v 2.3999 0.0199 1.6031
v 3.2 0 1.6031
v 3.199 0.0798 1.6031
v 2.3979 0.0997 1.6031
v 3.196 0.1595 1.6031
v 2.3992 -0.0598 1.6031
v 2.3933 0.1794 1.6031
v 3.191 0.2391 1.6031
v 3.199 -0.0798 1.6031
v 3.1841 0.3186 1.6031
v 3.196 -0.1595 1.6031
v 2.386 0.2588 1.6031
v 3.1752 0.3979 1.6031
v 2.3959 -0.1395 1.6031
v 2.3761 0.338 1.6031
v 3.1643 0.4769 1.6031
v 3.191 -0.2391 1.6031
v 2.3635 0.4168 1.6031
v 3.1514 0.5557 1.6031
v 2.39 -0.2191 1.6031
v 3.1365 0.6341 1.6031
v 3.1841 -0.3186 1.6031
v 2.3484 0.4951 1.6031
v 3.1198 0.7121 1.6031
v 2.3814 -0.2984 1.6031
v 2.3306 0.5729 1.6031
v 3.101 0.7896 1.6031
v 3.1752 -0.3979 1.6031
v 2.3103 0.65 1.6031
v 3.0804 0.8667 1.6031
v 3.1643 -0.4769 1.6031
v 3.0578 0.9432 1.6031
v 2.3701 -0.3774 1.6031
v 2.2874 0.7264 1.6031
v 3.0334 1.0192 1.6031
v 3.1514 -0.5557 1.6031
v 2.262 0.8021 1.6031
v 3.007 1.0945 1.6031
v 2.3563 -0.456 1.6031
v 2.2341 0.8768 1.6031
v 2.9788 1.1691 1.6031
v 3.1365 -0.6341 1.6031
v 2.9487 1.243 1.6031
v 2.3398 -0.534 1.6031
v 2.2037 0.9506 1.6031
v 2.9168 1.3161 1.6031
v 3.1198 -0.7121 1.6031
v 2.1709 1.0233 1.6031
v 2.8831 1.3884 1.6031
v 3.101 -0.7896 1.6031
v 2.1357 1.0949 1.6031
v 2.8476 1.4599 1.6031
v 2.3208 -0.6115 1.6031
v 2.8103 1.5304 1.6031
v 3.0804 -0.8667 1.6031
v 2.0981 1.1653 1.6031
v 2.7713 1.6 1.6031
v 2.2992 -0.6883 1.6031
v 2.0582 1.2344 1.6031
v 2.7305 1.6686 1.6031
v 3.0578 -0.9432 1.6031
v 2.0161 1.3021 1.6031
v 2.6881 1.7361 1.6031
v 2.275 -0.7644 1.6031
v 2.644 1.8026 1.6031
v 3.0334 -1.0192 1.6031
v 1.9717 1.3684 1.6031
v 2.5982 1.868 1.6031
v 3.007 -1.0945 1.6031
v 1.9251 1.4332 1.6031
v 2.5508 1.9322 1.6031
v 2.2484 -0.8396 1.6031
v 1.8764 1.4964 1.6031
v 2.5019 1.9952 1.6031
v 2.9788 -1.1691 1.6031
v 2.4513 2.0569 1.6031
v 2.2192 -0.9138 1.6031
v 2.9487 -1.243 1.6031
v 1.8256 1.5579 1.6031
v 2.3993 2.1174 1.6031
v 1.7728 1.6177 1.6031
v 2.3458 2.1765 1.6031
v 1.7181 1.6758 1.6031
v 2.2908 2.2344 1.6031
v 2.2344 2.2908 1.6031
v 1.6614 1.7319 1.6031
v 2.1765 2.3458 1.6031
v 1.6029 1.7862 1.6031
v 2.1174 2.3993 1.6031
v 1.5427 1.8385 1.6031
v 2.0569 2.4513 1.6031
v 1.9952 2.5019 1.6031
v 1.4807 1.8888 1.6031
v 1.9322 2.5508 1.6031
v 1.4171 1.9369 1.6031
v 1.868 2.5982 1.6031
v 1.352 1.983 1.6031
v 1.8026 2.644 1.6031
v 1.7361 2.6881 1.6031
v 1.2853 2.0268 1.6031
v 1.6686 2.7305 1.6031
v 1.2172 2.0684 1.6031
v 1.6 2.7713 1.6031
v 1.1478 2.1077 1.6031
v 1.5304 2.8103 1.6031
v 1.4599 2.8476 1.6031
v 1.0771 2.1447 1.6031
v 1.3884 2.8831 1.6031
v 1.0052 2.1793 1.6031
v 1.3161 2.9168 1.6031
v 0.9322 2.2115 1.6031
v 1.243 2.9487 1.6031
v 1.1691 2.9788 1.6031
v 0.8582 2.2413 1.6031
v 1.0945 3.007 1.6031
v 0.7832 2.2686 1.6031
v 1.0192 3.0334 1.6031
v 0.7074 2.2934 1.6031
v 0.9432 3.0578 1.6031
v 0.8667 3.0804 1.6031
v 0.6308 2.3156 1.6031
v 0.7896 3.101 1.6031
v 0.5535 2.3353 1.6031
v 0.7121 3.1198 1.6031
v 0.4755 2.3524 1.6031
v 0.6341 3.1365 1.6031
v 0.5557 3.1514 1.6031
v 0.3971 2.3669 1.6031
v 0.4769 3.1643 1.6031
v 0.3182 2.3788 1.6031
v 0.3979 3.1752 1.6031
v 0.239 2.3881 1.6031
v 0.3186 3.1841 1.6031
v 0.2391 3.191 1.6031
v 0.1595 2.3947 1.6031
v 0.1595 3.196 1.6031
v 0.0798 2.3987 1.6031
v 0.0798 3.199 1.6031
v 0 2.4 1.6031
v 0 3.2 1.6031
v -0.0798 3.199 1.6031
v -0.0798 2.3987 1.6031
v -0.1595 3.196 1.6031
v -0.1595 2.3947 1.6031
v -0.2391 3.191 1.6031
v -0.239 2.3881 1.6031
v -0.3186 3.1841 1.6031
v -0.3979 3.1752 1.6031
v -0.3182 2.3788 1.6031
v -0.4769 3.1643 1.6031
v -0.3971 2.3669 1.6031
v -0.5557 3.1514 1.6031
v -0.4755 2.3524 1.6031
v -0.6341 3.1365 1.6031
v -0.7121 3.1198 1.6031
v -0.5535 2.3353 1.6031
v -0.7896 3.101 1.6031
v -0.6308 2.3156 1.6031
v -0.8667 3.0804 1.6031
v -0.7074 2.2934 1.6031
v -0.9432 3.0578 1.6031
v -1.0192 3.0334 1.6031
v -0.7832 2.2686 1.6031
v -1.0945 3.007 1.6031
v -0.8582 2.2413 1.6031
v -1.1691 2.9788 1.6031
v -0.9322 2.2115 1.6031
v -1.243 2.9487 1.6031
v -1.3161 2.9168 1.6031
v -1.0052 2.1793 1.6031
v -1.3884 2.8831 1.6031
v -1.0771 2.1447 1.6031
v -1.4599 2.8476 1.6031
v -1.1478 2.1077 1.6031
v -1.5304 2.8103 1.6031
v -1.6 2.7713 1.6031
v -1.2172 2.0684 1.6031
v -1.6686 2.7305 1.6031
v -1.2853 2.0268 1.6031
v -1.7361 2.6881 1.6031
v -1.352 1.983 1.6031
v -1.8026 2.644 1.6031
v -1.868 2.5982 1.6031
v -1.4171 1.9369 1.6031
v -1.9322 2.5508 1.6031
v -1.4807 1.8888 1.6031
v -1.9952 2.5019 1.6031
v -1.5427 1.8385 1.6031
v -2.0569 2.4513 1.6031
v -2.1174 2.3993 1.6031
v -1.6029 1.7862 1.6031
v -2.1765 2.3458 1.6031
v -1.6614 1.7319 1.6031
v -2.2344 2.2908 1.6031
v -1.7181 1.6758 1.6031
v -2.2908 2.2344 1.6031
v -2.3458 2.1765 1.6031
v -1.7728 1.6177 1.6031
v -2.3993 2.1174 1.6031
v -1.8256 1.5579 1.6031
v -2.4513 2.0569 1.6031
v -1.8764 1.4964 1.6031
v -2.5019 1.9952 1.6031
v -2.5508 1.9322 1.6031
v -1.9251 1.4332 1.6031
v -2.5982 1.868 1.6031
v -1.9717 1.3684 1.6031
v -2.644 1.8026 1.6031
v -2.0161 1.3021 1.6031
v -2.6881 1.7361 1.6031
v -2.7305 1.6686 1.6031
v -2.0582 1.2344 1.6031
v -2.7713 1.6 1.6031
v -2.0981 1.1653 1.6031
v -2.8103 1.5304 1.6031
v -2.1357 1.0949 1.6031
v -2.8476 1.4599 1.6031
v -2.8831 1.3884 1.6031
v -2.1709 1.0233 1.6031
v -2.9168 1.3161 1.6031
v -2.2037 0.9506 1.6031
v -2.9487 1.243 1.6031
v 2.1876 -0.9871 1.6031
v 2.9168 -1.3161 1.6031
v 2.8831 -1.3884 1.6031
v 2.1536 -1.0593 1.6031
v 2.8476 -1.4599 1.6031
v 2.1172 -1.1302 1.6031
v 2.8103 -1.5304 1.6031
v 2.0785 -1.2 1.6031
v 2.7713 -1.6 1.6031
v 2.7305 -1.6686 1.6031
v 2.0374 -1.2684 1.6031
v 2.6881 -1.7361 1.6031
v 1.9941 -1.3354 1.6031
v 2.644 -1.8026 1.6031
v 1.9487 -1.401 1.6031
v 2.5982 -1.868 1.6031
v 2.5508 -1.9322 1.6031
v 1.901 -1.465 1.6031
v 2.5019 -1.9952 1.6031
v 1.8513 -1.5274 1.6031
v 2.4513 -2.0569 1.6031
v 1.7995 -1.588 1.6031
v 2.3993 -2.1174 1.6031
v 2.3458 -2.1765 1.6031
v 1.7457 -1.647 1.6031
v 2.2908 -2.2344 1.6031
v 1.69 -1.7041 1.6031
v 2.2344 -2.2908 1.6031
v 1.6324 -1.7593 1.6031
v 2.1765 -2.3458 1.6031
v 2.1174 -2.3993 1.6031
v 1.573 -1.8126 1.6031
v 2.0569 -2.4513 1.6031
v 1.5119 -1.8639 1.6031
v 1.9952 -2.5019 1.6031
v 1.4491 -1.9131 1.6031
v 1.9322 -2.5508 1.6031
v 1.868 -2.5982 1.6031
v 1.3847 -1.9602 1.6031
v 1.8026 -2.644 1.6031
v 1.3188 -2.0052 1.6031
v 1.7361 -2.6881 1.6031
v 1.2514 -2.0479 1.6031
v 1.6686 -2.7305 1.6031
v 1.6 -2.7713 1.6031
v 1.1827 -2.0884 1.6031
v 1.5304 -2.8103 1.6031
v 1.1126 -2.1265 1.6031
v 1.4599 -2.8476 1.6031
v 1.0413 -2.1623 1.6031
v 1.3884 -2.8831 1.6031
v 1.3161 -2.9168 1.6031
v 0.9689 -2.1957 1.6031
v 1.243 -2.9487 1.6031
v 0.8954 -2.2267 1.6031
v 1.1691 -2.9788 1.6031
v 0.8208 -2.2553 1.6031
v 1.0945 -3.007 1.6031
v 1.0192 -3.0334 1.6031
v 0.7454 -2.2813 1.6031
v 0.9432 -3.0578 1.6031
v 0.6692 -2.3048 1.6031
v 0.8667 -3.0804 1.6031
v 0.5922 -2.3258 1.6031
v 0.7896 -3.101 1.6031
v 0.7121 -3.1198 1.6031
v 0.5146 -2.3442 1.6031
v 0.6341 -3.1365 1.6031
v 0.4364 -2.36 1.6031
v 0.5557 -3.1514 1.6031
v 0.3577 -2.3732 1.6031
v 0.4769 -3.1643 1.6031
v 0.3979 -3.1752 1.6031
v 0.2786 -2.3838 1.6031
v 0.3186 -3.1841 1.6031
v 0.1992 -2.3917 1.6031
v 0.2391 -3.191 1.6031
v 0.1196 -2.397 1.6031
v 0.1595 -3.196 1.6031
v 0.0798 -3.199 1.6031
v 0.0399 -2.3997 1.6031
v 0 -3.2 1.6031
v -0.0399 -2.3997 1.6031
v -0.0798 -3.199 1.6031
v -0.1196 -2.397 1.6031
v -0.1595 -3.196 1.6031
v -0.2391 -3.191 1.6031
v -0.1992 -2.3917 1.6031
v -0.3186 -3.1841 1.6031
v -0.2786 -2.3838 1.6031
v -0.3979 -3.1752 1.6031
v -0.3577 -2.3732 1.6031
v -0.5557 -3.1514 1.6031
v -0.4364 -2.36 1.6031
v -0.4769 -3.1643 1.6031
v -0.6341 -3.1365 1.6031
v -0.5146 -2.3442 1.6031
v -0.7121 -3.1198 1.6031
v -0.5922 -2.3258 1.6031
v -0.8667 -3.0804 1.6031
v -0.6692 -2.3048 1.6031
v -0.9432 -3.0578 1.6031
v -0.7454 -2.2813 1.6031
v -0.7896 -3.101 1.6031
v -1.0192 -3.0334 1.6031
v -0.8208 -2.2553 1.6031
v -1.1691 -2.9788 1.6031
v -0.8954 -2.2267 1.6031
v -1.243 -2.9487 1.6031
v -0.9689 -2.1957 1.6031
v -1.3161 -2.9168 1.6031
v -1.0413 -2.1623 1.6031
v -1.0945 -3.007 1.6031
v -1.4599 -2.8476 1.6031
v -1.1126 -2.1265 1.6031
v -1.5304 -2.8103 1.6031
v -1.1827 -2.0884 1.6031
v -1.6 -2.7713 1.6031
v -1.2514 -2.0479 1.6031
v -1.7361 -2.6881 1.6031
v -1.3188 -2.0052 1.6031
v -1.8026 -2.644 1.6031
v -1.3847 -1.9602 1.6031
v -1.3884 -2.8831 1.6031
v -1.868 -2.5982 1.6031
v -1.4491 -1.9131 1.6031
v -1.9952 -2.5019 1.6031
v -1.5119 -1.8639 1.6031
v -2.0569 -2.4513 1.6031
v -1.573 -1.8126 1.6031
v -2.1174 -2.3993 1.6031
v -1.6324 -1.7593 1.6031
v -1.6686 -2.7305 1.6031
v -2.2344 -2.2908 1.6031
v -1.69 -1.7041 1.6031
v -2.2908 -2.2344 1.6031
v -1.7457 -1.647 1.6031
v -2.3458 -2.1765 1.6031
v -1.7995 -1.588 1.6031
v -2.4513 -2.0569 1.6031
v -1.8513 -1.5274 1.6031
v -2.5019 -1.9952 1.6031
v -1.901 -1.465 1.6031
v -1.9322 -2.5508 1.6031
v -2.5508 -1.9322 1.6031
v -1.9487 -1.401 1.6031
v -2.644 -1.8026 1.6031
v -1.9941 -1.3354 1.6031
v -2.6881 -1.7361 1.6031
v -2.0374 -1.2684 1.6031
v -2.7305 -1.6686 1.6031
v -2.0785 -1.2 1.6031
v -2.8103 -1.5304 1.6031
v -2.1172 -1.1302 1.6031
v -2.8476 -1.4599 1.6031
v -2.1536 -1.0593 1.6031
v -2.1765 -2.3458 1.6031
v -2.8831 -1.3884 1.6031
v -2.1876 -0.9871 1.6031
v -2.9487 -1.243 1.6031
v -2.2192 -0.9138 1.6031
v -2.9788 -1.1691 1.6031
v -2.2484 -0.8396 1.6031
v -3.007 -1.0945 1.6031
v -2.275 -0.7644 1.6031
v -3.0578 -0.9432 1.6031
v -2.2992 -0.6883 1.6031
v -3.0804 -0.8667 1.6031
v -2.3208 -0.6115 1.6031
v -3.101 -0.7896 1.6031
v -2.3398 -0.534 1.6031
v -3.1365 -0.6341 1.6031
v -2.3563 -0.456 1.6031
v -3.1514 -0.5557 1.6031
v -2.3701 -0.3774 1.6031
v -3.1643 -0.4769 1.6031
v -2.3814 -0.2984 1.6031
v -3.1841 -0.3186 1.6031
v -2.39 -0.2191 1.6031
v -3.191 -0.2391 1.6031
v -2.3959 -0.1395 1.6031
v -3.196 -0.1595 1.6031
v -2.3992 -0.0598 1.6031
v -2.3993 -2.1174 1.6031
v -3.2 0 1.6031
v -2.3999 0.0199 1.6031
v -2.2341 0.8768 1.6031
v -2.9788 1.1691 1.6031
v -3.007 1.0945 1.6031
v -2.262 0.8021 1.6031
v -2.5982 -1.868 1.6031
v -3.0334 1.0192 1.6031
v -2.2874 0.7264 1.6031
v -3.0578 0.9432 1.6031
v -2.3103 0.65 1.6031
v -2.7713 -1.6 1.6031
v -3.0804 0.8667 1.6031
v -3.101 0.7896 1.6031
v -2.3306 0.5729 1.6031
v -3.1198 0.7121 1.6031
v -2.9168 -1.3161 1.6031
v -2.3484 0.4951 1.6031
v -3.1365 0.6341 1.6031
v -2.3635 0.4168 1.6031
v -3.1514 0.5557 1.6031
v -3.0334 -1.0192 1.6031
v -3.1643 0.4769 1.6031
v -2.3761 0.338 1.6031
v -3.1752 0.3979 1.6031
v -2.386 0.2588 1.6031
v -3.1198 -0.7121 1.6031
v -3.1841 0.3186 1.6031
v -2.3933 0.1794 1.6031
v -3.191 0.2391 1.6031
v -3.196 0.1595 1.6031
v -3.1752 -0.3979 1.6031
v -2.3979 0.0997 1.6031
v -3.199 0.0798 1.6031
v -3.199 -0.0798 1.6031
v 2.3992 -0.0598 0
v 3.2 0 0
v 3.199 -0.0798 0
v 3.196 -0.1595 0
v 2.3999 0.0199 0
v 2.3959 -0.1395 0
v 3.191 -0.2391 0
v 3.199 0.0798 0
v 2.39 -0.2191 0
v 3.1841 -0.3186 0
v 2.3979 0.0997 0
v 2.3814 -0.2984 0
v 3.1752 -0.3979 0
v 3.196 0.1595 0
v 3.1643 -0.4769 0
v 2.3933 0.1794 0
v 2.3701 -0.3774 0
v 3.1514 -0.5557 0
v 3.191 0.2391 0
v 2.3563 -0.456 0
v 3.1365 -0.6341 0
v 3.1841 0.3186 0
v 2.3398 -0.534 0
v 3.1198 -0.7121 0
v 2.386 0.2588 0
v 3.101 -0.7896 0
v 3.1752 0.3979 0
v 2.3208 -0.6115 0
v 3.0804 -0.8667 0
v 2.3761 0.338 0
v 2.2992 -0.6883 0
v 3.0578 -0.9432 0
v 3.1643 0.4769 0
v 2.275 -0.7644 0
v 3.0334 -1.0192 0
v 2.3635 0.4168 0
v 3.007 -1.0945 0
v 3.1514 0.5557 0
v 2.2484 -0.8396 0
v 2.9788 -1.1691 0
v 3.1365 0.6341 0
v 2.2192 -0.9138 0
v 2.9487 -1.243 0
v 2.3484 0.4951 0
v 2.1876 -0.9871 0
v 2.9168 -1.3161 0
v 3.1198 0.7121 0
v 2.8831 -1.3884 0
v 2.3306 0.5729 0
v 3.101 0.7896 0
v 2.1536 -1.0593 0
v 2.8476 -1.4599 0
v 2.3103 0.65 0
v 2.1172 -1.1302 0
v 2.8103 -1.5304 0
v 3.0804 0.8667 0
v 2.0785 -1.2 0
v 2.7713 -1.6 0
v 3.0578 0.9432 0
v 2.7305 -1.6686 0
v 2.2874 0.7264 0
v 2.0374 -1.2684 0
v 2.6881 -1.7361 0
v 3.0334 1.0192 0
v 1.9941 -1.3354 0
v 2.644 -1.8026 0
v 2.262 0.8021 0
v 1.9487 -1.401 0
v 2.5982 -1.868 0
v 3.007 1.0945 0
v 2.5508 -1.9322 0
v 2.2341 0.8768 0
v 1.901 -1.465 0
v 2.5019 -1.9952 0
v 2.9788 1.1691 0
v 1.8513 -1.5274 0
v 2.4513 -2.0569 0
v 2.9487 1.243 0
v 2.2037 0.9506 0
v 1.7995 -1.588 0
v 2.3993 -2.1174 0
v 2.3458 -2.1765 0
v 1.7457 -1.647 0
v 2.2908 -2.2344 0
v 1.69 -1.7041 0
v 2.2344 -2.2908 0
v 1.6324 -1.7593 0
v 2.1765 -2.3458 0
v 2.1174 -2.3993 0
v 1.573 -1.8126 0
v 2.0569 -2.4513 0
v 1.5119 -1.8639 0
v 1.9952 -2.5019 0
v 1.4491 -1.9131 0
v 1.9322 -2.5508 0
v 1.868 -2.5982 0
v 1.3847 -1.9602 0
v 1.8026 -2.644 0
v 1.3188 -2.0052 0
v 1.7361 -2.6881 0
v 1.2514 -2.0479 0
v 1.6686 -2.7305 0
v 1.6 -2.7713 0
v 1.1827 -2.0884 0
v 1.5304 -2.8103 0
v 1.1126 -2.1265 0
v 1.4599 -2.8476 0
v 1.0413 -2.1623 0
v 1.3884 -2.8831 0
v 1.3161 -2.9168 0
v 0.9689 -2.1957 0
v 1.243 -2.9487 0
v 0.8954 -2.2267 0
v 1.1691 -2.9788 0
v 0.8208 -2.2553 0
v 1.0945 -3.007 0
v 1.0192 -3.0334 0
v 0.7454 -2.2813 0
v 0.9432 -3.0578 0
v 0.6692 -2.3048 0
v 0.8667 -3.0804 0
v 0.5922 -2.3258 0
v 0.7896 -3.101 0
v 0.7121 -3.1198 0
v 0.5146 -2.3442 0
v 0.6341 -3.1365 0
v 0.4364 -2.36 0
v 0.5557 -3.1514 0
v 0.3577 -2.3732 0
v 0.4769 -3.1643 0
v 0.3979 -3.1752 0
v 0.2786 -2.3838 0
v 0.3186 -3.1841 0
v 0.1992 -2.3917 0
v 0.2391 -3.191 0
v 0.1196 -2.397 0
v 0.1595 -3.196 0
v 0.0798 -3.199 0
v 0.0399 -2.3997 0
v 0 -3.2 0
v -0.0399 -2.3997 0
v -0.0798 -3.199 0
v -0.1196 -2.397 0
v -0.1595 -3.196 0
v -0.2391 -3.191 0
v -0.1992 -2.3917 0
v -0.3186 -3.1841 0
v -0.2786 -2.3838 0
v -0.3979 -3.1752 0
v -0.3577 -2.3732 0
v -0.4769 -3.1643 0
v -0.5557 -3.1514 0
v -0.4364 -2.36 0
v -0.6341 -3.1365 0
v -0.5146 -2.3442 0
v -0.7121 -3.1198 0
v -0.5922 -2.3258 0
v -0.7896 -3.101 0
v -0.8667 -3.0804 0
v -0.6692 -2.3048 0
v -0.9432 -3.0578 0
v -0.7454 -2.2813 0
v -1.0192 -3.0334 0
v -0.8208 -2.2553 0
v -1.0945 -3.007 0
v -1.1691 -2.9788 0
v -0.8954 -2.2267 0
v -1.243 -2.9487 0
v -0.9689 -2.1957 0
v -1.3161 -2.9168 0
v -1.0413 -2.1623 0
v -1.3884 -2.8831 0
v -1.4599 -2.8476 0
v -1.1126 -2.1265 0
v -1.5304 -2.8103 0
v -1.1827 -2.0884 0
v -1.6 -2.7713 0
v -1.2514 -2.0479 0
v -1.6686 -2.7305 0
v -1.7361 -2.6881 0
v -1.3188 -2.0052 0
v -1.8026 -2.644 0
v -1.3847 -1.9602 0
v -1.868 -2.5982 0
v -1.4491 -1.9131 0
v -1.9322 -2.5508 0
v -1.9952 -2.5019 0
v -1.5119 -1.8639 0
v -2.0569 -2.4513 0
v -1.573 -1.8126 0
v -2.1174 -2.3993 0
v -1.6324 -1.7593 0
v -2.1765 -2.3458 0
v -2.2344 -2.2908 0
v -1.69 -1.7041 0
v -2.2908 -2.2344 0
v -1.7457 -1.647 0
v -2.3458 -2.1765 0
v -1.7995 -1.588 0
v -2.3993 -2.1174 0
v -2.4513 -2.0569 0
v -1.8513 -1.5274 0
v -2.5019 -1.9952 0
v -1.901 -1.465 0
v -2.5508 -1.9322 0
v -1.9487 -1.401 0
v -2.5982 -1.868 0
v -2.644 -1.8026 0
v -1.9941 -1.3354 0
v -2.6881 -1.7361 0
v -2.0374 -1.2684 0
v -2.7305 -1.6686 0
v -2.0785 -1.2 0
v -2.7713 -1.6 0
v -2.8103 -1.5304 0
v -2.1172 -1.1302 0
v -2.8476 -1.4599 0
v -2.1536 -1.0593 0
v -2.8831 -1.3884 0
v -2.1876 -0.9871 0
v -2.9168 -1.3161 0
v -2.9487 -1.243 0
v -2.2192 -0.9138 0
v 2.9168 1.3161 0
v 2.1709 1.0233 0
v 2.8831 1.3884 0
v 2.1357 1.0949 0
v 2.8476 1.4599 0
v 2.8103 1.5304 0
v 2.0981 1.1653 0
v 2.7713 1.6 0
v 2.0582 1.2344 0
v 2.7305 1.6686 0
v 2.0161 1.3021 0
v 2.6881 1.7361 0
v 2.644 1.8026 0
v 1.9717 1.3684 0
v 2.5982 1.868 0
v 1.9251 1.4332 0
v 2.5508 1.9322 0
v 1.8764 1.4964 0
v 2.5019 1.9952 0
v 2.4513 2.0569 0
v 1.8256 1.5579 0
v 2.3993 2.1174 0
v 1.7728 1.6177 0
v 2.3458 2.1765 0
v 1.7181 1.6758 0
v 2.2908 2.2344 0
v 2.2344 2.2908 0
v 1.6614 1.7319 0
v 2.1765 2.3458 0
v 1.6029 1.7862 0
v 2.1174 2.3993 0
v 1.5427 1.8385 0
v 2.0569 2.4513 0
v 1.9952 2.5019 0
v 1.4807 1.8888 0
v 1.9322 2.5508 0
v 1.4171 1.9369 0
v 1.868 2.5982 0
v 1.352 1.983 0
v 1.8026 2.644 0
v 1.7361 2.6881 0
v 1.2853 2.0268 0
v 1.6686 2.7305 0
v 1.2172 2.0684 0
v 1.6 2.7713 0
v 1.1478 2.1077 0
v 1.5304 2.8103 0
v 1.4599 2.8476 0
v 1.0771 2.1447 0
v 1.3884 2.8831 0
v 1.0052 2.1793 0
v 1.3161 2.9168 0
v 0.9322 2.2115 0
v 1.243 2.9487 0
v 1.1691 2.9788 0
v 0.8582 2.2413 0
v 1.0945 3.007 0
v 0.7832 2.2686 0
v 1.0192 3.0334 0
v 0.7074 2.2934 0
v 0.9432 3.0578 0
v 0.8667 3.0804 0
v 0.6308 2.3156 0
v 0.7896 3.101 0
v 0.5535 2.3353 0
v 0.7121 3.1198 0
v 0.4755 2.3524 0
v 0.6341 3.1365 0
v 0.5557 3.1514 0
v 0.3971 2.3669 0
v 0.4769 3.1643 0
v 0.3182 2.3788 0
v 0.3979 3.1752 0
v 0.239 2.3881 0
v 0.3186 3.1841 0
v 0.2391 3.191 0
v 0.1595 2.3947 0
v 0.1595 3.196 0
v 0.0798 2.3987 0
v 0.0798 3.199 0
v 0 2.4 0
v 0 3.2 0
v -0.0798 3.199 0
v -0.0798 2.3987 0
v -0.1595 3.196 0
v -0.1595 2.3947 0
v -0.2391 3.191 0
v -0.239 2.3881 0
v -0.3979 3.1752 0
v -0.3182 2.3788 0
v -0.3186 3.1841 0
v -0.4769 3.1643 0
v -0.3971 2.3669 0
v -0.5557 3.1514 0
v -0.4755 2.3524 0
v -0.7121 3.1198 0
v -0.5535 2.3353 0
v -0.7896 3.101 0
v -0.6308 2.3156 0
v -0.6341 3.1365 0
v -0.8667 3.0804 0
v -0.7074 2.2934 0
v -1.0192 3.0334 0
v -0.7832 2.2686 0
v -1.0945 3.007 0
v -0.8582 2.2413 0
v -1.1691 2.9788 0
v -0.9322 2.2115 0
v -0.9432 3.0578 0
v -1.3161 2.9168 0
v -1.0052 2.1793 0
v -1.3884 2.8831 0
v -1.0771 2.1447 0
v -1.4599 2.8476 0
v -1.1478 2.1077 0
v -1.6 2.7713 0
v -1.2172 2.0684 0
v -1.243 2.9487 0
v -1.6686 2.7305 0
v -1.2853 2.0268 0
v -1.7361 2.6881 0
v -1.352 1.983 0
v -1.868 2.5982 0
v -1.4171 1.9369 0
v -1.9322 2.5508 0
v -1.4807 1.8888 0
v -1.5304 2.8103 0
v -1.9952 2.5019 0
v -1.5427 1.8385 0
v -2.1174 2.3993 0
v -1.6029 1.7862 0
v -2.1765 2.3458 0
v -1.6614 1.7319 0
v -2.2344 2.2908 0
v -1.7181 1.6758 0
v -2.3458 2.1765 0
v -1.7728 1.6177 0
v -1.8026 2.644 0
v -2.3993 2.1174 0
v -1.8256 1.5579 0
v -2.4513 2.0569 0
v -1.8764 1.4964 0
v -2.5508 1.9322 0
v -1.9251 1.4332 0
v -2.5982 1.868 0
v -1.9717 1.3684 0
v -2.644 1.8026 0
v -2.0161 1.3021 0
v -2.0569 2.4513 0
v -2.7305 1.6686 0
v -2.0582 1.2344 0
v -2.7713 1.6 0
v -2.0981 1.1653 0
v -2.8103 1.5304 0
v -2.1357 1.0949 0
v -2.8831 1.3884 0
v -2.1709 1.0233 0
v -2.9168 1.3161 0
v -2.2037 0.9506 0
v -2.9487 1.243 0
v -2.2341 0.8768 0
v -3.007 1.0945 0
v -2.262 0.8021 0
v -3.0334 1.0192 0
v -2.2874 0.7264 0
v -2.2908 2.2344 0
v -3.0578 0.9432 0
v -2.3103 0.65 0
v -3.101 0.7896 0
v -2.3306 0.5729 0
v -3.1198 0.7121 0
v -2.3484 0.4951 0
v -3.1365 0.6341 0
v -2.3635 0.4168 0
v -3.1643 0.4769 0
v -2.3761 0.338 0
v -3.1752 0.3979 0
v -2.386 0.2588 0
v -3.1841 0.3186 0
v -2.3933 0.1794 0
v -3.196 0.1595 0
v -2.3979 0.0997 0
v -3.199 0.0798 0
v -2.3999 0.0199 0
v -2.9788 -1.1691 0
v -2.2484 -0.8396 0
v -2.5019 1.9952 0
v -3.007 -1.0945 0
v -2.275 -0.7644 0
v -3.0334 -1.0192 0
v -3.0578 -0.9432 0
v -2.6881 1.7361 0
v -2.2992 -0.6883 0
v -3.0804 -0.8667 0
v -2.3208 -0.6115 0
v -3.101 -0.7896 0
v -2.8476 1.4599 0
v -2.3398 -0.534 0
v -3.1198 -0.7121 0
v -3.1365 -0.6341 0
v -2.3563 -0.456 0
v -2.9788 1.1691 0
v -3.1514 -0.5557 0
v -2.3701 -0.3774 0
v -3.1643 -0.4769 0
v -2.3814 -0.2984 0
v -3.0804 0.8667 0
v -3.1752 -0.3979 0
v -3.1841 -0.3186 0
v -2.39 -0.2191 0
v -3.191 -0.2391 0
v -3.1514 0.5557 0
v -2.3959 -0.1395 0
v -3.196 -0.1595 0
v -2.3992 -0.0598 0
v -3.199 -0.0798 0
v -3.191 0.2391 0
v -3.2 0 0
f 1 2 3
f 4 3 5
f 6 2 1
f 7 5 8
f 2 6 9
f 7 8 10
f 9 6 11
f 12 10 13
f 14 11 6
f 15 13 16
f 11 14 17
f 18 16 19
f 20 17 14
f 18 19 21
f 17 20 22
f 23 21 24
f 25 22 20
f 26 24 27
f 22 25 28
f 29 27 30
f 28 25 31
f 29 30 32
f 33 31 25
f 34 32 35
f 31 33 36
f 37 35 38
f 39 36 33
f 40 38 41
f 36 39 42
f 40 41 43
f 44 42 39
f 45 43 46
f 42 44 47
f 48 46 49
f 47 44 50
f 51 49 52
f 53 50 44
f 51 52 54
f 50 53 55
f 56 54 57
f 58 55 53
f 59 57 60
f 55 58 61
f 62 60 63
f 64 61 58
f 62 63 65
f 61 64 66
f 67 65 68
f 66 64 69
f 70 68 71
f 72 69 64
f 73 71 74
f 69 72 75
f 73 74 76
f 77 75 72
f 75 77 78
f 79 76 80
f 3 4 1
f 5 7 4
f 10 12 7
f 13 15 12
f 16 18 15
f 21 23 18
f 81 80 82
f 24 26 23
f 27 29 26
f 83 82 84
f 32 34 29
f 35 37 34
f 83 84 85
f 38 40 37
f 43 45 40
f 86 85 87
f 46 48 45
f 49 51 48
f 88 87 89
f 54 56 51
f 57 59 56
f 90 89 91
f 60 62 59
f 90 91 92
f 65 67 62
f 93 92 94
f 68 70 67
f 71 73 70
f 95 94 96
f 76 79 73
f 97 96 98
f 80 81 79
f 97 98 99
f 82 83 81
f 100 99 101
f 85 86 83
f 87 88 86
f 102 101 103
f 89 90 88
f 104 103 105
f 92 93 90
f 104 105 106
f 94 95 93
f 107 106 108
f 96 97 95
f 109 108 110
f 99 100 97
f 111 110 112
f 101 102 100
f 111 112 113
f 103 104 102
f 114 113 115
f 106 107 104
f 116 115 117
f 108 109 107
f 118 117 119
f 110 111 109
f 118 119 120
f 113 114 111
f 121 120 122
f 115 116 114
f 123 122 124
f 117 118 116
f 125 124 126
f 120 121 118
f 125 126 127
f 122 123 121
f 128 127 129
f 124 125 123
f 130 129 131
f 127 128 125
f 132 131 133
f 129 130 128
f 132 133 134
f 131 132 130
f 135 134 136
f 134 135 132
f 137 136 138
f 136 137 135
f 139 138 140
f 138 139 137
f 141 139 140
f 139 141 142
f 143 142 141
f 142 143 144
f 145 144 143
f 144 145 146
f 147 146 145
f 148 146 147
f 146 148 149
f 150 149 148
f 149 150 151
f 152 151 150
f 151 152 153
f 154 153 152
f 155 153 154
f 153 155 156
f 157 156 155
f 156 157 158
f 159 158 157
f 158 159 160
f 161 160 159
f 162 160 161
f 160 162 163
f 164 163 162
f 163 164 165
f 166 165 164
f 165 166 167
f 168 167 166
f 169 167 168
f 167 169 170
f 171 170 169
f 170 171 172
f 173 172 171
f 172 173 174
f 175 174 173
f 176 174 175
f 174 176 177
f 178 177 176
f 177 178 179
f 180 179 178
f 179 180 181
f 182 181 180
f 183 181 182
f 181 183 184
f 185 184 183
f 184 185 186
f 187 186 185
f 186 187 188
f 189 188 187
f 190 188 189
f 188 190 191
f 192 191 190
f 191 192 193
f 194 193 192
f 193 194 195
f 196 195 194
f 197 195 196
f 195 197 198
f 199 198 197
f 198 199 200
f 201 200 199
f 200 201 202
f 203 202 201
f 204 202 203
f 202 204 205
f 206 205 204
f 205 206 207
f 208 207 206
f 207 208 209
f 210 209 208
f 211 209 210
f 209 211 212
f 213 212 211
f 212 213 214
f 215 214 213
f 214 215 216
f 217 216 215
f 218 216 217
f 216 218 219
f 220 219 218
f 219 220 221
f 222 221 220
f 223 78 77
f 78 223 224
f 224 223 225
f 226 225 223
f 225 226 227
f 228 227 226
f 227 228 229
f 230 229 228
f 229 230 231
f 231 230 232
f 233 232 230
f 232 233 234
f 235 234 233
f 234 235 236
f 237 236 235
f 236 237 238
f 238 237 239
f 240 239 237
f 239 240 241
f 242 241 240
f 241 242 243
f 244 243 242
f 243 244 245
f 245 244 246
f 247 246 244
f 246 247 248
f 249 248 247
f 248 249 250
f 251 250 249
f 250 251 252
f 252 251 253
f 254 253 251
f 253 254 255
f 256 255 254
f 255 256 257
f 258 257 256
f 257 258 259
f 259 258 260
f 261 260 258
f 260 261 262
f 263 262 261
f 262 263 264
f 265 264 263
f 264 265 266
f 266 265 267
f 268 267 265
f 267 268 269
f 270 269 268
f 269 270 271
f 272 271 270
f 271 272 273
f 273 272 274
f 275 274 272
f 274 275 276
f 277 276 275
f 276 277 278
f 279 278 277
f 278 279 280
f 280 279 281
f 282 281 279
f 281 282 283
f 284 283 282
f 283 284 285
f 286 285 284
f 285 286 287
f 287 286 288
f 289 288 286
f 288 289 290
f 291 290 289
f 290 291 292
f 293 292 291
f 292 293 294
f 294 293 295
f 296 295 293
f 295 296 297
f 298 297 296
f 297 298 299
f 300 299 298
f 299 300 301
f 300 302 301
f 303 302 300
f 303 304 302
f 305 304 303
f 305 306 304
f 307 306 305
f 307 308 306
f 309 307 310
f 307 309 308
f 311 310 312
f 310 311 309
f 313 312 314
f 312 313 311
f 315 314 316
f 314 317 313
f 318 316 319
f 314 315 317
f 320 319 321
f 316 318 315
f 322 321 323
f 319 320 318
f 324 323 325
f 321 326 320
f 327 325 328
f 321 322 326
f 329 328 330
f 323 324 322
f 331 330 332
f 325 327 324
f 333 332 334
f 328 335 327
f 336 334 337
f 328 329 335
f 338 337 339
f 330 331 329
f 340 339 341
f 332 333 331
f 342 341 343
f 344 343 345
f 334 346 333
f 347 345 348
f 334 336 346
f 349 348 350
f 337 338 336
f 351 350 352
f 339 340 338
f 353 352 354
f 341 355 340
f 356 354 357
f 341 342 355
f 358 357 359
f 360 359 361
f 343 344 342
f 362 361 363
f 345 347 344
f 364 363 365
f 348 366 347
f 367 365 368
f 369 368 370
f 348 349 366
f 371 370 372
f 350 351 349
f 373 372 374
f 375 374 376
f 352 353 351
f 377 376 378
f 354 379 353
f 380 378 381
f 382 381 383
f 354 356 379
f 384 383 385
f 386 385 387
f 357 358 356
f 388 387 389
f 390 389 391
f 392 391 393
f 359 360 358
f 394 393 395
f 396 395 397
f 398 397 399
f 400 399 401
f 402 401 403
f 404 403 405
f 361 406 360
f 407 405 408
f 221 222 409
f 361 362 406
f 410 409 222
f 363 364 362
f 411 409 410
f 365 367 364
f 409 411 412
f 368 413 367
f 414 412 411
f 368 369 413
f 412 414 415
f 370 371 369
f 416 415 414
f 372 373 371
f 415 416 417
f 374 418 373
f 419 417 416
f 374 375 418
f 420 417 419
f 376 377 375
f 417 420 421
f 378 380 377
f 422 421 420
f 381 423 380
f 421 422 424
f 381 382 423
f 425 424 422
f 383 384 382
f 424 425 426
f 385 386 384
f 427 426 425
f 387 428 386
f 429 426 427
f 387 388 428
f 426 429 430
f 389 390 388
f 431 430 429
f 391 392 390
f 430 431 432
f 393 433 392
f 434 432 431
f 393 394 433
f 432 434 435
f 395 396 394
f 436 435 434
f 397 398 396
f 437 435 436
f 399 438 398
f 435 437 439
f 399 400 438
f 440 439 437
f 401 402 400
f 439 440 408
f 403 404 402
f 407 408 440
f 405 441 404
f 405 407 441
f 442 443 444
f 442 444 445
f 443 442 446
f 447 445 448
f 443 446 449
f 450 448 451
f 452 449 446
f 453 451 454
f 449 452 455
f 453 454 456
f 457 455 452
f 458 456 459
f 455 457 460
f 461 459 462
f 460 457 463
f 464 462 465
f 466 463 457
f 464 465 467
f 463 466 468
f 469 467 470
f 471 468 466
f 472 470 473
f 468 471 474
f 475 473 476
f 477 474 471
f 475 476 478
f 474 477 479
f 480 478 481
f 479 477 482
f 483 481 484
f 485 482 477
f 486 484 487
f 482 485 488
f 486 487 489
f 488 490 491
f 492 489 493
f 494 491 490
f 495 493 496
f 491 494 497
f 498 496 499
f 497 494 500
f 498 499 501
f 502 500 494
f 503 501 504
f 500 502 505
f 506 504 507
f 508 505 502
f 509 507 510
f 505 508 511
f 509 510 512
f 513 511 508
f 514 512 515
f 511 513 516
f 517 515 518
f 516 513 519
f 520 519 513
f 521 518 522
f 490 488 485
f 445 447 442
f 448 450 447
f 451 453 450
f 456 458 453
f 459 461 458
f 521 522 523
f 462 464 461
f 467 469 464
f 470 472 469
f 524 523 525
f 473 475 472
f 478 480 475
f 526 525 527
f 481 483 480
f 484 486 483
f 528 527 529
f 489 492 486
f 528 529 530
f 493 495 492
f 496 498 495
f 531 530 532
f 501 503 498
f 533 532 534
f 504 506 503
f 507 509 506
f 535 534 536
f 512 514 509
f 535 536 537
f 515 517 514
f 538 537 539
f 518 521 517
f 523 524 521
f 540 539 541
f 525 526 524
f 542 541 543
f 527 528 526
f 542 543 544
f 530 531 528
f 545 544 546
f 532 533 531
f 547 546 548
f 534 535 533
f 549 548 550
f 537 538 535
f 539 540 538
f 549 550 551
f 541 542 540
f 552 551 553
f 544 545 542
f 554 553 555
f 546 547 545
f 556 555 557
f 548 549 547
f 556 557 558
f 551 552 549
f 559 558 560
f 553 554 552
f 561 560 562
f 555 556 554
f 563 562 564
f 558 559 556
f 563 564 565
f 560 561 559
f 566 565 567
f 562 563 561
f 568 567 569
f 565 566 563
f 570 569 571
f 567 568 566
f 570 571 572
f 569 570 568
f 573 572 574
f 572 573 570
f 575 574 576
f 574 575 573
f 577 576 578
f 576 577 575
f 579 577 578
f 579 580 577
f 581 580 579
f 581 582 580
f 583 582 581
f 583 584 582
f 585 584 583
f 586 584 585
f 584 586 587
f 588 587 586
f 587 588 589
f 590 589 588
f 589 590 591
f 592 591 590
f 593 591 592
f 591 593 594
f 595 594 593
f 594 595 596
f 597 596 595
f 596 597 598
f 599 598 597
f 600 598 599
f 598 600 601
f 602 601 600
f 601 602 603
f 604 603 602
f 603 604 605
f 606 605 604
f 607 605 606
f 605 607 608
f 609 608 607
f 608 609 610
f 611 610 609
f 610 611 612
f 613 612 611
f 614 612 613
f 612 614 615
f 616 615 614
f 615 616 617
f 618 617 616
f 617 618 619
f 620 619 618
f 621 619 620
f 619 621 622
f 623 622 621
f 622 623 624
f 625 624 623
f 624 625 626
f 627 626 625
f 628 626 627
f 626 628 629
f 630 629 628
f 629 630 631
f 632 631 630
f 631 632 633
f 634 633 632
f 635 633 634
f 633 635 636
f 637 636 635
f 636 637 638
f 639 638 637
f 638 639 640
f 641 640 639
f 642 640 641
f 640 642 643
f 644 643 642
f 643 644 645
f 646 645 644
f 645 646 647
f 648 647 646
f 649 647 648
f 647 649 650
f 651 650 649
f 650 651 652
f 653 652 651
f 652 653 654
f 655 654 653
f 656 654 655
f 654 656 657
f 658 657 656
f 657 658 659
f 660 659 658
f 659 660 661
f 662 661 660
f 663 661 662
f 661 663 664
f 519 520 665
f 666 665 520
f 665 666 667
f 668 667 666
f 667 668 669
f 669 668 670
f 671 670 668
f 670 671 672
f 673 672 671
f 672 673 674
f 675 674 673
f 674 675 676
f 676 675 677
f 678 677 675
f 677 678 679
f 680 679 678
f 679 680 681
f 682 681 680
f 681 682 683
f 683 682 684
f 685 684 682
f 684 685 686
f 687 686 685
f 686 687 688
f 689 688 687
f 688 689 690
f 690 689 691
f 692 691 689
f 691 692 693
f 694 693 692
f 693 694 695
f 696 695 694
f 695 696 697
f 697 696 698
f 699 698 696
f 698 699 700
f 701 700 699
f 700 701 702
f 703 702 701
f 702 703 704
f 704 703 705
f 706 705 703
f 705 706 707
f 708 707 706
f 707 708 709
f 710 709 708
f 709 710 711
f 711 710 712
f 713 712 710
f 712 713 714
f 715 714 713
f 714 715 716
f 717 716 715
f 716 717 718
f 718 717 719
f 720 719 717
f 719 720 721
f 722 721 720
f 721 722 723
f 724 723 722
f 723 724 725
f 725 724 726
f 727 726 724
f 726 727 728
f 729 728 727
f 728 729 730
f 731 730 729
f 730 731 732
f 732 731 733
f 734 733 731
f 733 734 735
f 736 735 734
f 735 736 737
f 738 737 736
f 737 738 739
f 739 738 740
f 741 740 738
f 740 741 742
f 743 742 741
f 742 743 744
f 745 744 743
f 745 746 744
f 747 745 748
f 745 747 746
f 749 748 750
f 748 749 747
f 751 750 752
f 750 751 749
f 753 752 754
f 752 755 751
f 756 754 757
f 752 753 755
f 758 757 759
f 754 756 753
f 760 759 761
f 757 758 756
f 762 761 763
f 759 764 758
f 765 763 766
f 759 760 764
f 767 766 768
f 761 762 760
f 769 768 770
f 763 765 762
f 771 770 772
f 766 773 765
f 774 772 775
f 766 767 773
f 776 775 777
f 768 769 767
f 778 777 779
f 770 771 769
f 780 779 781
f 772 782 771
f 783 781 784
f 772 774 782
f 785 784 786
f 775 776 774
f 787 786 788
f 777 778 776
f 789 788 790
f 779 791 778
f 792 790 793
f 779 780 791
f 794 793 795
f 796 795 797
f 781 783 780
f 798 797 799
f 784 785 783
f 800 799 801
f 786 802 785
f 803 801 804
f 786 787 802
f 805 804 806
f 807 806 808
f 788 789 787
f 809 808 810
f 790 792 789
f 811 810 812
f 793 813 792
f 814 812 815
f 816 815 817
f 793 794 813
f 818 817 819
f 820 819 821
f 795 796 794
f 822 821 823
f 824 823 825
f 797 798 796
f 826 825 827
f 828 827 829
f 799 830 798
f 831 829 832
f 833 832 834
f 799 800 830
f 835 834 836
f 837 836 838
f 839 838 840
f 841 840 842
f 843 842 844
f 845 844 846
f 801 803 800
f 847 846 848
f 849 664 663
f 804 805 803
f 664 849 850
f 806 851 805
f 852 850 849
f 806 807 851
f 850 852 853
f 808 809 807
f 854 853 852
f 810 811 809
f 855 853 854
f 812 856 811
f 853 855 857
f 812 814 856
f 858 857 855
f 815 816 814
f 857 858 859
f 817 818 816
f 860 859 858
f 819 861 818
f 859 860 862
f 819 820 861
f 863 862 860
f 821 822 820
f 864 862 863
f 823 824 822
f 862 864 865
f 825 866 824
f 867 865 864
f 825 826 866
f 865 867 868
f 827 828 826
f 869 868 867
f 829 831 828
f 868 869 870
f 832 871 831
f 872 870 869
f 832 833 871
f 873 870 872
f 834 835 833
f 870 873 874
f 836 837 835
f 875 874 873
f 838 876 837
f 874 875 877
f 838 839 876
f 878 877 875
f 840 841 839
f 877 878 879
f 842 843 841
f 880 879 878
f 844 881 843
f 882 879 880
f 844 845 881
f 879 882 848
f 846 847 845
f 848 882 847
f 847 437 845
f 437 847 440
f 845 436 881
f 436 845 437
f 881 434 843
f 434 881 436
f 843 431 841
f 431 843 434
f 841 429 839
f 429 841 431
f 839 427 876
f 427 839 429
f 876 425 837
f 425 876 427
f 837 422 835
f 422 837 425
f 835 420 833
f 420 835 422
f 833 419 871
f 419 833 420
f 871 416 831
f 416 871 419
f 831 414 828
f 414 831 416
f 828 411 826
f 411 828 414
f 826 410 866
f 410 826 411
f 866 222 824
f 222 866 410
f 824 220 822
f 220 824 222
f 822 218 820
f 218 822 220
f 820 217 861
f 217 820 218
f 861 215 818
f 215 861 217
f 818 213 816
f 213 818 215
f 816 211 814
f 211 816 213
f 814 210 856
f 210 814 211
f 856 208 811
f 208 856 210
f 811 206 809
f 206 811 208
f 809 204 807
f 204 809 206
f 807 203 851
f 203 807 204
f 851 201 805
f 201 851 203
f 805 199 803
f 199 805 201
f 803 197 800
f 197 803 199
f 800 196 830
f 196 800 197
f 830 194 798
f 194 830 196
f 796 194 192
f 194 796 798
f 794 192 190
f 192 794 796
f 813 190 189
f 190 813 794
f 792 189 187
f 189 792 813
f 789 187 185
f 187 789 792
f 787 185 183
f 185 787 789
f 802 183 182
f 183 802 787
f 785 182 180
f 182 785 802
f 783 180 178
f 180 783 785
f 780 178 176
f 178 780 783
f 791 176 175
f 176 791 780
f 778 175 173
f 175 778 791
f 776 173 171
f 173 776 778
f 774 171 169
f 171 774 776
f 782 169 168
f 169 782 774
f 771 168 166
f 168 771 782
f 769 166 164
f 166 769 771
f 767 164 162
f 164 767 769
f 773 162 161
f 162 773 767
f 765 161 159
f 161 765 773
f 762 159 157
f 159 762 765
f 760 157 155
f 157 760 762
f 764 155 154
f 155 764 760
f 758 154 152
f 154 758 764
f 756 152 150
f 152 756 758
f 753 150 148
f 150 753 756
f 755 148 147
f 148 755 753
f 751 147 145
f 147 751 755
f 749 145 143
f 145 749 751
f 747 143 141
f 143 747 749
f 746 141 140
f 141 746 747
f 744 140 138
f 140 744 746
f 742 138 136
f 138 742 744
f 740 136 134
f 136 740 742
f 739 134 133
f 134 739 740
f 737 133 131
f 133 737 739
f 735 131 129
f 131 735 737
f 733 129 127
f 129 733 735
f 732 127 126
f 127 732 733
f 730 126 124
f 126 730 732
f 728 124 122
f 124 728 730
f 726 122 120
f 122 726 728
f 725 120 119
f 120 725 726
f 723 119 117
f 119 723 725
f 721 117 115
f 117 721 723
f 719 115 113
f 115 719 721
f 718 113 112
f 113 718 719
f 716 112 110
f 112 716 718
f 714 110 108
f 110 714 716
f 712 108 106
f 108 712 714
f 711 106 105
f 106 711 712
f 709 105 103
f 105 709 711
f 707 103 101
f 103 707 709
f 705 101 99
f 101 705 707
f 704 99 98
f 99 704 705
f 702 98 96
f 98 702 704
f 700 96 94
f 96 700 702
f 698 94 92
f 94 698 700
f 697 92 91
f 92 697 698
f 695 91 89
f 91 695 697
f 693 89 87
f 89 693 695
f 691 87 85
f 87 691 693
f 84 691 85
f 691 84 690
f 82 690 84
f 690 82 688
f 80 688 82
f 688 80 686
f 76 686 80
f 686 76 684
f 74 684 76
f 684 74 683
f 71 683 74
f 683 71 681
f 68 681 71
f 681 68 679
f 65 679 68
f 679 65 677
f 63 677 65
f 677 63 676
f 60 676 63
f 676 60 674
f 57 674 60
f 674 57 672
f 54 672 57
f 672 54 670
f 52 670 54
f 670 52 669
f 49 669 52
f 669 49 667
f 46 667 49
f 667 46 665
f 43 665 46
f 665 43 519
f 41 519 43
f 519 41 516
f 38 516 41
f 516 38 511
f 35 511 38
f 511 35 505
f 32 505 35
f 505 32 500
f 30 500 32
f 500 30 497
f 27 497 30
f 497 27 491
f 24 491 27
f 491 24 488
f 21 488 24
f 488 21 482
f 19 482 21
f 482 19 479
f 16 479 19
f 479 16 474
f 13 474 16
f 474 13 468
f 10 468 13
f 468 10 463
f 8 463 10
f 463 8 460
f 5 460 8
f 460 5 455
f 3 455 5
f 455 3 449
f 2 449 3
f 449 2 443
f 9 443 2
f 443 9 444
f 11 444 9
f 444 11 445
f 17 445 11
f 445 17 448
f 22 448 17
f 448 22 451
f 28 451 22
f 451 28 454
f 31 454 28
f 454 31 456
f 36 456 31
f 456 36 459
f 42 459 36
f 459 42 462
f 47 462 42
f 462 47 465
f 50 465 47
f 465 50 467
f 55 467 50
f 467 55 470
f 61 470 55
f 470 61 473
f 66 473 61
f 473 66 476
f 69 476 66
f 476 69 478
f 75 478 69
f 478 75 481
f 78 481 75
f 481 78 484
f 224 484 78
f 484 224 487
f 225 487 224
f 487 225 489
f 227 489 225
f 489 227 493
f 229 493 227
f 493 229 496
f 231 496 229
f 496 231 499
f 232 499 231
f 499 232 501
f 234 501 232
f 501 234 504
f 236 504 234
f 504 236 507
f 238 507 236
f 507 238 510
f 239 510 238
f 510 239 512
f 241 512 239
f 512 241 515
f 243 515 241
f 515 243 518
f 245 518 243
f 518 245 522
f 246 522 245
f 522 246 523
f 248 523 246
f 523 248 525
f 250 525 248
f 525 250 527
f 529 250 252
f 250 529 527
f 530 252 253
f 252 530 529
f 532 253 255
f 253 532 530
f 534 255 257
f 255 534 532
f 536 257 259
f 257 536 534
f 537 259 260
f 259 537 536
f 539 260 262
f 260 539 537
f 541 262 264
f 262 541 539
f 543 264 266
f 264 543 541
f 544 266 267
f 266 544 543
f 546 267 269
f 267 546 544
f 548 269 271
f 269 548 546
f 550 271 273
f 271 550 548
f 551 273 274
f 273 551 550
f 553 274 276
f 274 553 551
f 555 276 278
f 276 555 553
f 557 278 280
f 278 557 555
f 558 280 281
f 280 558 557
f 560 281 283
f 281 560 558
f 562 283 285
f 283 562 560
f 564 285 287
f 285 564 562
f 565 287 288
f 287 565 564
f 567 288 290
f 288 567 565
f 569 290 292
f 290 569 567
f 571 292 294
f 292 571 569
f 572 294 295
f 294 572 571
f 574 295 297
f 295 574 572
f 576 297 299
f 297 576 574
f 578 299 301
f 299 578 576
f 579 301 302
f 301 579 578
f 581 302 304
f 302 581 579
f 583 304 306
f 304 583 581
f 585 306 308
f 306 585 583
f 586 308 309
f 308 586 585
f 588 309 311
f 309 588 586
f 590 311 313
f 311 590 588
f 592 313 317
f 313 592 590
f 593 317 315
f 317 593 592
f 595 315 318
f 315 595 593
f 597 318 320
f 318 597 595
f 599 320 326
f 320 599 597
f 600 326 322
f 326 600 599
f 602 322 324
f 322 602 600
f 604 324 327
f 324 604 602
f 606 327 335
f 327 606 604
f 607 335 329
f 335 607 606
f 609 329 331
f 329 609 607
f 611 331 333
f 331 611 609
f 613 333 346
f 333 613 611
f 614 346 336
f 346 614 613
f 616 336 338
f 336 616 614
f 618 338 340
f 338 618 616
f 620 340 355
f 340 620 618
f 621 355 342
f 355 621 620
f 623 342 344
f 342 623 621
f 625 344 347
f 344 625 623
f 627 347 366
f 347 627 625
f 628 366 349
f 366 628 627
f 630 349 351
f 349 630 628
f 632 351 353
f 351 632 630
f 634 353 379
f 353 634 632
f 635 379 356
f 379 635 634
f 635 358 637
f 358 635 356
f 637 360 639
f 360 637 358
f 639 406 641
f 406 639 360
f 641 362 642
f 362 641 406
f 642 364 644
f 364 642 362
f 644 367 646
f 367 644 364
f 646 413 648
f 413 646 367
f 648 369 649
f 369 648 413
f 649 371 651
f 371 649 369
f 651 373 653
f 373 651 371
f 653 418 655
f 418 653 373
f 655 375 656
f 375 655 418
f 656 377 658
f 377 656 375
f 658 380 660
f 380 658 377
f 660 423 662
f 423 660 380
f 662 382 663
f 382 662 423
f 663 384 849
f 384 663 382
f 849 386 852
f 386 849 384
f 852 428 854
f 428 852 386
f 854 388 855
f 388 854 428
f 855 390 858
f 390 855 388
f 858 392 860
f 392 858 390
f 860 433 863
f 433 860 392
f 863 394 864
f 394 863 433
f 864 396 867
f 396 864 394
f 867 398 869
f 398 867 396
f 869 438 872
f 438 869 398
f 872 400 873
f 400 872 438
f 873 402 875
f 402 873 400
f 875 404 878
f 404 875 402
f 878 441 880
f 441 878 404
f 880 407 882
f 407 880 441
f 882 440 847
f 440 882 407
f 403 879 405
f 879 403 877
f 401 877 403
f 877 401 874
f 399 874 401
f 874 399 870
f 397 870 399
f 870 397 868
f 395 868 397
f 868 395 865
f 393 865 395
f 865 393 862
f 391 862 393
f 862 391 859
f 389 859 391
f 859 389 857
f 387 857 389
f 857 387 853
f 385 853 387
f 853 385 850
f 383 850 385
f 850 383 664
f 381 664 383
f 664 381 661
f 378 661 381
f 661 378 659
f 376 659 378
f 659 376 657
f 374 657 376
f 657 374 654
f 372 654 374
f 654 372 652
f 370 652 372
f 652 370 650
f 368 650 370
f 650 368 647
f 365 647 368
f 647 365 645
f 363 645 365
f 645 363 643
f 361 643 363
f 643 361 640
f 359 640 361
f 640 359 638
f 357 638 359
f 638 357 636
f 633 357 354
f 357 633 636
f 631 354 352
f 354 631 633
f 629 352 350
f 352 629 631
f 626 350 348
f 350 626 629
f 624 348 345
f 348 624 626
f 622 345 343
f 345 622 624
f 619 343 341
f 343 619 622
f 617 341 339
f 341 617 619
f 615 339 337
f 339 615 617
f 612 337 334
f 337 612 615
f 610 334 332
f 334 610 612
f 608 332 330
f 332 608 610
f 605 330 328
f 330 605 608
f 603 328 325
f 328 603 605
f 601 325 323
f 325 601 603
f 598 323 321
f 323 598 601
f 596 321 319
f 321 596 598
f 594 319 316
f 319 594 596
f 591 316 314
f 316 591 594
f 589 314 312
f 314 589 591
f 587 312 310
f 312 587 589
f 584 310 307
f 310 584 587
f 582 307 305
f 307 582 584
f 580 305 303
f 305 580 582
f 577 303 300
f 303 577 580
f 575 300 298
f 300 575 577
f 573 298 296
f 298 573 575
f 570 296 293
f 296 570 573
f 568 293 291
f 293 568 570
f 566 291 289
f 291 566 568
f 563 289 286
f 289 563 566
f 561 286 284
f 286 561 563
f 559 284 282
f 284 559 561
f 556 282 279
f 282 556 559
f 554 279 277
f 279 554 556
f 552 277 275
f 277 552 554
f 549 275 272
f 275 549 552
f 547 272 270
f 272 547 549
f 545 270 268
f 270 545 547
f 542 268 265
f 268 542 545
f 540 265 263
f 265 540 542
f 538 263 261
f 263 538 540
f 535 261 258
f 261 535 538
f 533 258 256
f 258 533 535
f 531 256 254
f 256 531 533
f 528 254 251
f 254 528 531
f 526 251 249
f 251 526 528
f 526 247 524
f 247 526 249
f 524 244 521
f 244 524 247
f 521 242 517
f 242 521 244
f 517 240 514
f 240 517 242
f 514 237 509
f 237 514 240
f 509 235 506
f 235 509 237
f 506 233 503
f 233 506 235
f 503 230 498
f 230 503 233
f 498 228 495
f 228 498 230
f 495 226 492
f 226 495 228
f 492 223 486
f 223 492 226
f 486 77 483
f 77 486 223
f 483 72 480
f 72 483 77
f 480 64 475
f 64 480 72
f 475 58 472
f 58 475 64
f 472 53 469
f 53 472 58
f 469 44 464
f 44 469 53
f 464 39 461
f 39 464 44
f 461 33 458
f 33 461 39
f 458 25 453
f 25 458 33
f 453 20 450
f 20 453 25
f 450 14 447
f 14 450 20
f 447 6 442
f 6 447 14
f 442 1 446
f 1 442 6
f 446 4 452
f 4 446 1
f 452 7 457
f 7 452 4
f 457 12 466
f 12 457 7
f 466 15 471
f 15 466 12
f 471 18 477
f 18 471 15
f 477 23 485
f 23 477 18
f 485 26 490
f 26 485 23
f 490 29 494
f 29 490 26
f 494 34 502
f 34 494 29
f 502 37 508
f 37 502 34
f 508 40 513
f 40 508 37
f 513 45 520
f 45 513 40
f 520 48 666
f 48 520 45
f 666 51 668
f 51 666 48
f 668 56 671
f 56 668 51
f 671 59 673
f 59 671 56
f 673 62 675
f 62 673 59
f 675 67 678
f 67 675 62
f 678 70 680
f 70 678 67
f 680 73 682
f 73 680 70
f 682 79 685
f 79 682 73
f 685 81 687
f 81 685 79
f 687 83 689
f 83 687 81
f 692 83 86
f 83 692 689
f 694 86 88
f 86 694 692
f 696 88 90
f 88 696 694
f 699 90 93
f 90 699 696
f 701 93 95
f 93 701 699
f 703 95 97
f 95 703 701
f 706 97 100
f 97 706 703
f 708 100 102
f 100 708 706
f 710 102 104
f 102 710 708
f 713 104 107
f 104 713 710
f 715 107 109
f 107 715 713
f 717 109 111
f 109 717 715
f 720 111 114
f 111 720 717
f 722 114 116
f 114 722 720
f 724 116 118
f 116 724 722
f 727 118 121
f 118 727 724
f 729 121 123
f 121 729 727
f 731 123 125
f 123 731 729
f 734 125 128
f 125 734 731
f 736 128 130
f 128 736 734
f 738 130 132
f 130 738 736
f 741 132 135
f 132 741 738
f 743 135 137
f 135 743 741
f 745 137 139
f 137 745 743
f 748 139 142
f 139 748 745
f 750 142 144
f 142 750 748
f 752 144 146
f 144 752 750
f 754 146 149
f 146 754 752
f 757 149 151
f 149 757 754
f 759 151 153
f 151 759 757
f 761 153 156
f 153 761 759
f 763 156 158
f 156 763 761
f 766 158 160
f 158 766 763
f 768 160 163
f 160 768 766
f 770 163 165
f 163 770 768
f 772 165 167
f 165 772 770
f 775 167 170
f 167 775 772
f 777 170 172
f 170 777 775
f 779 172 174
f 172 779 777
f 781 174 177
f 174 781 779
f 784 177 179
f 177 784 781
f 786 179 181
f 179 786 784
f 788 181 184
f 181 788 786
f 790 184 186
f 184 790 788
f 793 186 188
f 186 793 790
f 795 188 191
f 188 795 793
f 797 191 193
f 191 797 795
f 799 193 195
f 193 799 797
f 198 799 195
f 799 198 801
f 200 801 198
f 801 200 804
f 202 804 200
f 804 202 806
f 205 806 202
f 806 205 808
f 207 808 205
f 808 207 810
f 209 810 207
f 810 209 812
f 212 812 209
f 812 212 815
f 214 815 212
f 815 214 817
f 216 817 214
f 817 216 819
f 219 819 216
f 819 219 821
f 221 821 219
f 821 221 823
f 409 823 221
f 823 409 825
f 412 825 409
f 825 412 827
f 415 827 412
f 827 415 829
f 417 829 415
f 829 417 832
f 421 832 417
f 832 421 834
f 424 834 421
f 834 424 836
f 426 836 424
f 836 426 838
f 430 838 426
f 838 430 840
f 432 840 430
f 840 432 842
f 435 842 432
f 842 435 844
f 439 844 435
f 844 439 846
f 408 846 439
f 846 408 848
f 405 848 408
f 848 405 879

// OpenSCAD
use <../lib.scad>
use <3625.scad>
$fa=1; $fs=0.2;
function ldraw_lib__390(realsolid=false) = [
// 0 ~Moved to 3625
// 0 Name: 390.dat
// 0 Author: [PTadmin]
// 0 !LDRAW_ORG Part UPDATE 2012-01
// 0 !LICENSE Licensed under CC BY 4.0 : see CAreadme.txt
// 
// 0 BFC CERTIFY CCW
  [0,"BFC","CERTIFY"],
  [0,"BFC","CCW"],
// 
// 0 !HISTORY 2012-03-30 [PTadmin] Official Update 2012-01
// 
// 
// 0 // Minifig Hair Female with Pigtails
// 1 16 0 0 0 1 0 0 0 1 0 0 0 1 3625.dat
  [1,16,0,0,0,1,0,0,0,1,0,0,0,1, ldraw_lib__3625(realsolid)],
];
module ldraw_lib__390(step=0, col=false, unit=2/5, alt=false, line=0.2, solid=!$preview)
    makepoly(ldraw_lib__390(solid), step=step, col=col, unit=unit, alt=alt, line=line, solid=solid);
ldraw_lib__390(line=0.2);
